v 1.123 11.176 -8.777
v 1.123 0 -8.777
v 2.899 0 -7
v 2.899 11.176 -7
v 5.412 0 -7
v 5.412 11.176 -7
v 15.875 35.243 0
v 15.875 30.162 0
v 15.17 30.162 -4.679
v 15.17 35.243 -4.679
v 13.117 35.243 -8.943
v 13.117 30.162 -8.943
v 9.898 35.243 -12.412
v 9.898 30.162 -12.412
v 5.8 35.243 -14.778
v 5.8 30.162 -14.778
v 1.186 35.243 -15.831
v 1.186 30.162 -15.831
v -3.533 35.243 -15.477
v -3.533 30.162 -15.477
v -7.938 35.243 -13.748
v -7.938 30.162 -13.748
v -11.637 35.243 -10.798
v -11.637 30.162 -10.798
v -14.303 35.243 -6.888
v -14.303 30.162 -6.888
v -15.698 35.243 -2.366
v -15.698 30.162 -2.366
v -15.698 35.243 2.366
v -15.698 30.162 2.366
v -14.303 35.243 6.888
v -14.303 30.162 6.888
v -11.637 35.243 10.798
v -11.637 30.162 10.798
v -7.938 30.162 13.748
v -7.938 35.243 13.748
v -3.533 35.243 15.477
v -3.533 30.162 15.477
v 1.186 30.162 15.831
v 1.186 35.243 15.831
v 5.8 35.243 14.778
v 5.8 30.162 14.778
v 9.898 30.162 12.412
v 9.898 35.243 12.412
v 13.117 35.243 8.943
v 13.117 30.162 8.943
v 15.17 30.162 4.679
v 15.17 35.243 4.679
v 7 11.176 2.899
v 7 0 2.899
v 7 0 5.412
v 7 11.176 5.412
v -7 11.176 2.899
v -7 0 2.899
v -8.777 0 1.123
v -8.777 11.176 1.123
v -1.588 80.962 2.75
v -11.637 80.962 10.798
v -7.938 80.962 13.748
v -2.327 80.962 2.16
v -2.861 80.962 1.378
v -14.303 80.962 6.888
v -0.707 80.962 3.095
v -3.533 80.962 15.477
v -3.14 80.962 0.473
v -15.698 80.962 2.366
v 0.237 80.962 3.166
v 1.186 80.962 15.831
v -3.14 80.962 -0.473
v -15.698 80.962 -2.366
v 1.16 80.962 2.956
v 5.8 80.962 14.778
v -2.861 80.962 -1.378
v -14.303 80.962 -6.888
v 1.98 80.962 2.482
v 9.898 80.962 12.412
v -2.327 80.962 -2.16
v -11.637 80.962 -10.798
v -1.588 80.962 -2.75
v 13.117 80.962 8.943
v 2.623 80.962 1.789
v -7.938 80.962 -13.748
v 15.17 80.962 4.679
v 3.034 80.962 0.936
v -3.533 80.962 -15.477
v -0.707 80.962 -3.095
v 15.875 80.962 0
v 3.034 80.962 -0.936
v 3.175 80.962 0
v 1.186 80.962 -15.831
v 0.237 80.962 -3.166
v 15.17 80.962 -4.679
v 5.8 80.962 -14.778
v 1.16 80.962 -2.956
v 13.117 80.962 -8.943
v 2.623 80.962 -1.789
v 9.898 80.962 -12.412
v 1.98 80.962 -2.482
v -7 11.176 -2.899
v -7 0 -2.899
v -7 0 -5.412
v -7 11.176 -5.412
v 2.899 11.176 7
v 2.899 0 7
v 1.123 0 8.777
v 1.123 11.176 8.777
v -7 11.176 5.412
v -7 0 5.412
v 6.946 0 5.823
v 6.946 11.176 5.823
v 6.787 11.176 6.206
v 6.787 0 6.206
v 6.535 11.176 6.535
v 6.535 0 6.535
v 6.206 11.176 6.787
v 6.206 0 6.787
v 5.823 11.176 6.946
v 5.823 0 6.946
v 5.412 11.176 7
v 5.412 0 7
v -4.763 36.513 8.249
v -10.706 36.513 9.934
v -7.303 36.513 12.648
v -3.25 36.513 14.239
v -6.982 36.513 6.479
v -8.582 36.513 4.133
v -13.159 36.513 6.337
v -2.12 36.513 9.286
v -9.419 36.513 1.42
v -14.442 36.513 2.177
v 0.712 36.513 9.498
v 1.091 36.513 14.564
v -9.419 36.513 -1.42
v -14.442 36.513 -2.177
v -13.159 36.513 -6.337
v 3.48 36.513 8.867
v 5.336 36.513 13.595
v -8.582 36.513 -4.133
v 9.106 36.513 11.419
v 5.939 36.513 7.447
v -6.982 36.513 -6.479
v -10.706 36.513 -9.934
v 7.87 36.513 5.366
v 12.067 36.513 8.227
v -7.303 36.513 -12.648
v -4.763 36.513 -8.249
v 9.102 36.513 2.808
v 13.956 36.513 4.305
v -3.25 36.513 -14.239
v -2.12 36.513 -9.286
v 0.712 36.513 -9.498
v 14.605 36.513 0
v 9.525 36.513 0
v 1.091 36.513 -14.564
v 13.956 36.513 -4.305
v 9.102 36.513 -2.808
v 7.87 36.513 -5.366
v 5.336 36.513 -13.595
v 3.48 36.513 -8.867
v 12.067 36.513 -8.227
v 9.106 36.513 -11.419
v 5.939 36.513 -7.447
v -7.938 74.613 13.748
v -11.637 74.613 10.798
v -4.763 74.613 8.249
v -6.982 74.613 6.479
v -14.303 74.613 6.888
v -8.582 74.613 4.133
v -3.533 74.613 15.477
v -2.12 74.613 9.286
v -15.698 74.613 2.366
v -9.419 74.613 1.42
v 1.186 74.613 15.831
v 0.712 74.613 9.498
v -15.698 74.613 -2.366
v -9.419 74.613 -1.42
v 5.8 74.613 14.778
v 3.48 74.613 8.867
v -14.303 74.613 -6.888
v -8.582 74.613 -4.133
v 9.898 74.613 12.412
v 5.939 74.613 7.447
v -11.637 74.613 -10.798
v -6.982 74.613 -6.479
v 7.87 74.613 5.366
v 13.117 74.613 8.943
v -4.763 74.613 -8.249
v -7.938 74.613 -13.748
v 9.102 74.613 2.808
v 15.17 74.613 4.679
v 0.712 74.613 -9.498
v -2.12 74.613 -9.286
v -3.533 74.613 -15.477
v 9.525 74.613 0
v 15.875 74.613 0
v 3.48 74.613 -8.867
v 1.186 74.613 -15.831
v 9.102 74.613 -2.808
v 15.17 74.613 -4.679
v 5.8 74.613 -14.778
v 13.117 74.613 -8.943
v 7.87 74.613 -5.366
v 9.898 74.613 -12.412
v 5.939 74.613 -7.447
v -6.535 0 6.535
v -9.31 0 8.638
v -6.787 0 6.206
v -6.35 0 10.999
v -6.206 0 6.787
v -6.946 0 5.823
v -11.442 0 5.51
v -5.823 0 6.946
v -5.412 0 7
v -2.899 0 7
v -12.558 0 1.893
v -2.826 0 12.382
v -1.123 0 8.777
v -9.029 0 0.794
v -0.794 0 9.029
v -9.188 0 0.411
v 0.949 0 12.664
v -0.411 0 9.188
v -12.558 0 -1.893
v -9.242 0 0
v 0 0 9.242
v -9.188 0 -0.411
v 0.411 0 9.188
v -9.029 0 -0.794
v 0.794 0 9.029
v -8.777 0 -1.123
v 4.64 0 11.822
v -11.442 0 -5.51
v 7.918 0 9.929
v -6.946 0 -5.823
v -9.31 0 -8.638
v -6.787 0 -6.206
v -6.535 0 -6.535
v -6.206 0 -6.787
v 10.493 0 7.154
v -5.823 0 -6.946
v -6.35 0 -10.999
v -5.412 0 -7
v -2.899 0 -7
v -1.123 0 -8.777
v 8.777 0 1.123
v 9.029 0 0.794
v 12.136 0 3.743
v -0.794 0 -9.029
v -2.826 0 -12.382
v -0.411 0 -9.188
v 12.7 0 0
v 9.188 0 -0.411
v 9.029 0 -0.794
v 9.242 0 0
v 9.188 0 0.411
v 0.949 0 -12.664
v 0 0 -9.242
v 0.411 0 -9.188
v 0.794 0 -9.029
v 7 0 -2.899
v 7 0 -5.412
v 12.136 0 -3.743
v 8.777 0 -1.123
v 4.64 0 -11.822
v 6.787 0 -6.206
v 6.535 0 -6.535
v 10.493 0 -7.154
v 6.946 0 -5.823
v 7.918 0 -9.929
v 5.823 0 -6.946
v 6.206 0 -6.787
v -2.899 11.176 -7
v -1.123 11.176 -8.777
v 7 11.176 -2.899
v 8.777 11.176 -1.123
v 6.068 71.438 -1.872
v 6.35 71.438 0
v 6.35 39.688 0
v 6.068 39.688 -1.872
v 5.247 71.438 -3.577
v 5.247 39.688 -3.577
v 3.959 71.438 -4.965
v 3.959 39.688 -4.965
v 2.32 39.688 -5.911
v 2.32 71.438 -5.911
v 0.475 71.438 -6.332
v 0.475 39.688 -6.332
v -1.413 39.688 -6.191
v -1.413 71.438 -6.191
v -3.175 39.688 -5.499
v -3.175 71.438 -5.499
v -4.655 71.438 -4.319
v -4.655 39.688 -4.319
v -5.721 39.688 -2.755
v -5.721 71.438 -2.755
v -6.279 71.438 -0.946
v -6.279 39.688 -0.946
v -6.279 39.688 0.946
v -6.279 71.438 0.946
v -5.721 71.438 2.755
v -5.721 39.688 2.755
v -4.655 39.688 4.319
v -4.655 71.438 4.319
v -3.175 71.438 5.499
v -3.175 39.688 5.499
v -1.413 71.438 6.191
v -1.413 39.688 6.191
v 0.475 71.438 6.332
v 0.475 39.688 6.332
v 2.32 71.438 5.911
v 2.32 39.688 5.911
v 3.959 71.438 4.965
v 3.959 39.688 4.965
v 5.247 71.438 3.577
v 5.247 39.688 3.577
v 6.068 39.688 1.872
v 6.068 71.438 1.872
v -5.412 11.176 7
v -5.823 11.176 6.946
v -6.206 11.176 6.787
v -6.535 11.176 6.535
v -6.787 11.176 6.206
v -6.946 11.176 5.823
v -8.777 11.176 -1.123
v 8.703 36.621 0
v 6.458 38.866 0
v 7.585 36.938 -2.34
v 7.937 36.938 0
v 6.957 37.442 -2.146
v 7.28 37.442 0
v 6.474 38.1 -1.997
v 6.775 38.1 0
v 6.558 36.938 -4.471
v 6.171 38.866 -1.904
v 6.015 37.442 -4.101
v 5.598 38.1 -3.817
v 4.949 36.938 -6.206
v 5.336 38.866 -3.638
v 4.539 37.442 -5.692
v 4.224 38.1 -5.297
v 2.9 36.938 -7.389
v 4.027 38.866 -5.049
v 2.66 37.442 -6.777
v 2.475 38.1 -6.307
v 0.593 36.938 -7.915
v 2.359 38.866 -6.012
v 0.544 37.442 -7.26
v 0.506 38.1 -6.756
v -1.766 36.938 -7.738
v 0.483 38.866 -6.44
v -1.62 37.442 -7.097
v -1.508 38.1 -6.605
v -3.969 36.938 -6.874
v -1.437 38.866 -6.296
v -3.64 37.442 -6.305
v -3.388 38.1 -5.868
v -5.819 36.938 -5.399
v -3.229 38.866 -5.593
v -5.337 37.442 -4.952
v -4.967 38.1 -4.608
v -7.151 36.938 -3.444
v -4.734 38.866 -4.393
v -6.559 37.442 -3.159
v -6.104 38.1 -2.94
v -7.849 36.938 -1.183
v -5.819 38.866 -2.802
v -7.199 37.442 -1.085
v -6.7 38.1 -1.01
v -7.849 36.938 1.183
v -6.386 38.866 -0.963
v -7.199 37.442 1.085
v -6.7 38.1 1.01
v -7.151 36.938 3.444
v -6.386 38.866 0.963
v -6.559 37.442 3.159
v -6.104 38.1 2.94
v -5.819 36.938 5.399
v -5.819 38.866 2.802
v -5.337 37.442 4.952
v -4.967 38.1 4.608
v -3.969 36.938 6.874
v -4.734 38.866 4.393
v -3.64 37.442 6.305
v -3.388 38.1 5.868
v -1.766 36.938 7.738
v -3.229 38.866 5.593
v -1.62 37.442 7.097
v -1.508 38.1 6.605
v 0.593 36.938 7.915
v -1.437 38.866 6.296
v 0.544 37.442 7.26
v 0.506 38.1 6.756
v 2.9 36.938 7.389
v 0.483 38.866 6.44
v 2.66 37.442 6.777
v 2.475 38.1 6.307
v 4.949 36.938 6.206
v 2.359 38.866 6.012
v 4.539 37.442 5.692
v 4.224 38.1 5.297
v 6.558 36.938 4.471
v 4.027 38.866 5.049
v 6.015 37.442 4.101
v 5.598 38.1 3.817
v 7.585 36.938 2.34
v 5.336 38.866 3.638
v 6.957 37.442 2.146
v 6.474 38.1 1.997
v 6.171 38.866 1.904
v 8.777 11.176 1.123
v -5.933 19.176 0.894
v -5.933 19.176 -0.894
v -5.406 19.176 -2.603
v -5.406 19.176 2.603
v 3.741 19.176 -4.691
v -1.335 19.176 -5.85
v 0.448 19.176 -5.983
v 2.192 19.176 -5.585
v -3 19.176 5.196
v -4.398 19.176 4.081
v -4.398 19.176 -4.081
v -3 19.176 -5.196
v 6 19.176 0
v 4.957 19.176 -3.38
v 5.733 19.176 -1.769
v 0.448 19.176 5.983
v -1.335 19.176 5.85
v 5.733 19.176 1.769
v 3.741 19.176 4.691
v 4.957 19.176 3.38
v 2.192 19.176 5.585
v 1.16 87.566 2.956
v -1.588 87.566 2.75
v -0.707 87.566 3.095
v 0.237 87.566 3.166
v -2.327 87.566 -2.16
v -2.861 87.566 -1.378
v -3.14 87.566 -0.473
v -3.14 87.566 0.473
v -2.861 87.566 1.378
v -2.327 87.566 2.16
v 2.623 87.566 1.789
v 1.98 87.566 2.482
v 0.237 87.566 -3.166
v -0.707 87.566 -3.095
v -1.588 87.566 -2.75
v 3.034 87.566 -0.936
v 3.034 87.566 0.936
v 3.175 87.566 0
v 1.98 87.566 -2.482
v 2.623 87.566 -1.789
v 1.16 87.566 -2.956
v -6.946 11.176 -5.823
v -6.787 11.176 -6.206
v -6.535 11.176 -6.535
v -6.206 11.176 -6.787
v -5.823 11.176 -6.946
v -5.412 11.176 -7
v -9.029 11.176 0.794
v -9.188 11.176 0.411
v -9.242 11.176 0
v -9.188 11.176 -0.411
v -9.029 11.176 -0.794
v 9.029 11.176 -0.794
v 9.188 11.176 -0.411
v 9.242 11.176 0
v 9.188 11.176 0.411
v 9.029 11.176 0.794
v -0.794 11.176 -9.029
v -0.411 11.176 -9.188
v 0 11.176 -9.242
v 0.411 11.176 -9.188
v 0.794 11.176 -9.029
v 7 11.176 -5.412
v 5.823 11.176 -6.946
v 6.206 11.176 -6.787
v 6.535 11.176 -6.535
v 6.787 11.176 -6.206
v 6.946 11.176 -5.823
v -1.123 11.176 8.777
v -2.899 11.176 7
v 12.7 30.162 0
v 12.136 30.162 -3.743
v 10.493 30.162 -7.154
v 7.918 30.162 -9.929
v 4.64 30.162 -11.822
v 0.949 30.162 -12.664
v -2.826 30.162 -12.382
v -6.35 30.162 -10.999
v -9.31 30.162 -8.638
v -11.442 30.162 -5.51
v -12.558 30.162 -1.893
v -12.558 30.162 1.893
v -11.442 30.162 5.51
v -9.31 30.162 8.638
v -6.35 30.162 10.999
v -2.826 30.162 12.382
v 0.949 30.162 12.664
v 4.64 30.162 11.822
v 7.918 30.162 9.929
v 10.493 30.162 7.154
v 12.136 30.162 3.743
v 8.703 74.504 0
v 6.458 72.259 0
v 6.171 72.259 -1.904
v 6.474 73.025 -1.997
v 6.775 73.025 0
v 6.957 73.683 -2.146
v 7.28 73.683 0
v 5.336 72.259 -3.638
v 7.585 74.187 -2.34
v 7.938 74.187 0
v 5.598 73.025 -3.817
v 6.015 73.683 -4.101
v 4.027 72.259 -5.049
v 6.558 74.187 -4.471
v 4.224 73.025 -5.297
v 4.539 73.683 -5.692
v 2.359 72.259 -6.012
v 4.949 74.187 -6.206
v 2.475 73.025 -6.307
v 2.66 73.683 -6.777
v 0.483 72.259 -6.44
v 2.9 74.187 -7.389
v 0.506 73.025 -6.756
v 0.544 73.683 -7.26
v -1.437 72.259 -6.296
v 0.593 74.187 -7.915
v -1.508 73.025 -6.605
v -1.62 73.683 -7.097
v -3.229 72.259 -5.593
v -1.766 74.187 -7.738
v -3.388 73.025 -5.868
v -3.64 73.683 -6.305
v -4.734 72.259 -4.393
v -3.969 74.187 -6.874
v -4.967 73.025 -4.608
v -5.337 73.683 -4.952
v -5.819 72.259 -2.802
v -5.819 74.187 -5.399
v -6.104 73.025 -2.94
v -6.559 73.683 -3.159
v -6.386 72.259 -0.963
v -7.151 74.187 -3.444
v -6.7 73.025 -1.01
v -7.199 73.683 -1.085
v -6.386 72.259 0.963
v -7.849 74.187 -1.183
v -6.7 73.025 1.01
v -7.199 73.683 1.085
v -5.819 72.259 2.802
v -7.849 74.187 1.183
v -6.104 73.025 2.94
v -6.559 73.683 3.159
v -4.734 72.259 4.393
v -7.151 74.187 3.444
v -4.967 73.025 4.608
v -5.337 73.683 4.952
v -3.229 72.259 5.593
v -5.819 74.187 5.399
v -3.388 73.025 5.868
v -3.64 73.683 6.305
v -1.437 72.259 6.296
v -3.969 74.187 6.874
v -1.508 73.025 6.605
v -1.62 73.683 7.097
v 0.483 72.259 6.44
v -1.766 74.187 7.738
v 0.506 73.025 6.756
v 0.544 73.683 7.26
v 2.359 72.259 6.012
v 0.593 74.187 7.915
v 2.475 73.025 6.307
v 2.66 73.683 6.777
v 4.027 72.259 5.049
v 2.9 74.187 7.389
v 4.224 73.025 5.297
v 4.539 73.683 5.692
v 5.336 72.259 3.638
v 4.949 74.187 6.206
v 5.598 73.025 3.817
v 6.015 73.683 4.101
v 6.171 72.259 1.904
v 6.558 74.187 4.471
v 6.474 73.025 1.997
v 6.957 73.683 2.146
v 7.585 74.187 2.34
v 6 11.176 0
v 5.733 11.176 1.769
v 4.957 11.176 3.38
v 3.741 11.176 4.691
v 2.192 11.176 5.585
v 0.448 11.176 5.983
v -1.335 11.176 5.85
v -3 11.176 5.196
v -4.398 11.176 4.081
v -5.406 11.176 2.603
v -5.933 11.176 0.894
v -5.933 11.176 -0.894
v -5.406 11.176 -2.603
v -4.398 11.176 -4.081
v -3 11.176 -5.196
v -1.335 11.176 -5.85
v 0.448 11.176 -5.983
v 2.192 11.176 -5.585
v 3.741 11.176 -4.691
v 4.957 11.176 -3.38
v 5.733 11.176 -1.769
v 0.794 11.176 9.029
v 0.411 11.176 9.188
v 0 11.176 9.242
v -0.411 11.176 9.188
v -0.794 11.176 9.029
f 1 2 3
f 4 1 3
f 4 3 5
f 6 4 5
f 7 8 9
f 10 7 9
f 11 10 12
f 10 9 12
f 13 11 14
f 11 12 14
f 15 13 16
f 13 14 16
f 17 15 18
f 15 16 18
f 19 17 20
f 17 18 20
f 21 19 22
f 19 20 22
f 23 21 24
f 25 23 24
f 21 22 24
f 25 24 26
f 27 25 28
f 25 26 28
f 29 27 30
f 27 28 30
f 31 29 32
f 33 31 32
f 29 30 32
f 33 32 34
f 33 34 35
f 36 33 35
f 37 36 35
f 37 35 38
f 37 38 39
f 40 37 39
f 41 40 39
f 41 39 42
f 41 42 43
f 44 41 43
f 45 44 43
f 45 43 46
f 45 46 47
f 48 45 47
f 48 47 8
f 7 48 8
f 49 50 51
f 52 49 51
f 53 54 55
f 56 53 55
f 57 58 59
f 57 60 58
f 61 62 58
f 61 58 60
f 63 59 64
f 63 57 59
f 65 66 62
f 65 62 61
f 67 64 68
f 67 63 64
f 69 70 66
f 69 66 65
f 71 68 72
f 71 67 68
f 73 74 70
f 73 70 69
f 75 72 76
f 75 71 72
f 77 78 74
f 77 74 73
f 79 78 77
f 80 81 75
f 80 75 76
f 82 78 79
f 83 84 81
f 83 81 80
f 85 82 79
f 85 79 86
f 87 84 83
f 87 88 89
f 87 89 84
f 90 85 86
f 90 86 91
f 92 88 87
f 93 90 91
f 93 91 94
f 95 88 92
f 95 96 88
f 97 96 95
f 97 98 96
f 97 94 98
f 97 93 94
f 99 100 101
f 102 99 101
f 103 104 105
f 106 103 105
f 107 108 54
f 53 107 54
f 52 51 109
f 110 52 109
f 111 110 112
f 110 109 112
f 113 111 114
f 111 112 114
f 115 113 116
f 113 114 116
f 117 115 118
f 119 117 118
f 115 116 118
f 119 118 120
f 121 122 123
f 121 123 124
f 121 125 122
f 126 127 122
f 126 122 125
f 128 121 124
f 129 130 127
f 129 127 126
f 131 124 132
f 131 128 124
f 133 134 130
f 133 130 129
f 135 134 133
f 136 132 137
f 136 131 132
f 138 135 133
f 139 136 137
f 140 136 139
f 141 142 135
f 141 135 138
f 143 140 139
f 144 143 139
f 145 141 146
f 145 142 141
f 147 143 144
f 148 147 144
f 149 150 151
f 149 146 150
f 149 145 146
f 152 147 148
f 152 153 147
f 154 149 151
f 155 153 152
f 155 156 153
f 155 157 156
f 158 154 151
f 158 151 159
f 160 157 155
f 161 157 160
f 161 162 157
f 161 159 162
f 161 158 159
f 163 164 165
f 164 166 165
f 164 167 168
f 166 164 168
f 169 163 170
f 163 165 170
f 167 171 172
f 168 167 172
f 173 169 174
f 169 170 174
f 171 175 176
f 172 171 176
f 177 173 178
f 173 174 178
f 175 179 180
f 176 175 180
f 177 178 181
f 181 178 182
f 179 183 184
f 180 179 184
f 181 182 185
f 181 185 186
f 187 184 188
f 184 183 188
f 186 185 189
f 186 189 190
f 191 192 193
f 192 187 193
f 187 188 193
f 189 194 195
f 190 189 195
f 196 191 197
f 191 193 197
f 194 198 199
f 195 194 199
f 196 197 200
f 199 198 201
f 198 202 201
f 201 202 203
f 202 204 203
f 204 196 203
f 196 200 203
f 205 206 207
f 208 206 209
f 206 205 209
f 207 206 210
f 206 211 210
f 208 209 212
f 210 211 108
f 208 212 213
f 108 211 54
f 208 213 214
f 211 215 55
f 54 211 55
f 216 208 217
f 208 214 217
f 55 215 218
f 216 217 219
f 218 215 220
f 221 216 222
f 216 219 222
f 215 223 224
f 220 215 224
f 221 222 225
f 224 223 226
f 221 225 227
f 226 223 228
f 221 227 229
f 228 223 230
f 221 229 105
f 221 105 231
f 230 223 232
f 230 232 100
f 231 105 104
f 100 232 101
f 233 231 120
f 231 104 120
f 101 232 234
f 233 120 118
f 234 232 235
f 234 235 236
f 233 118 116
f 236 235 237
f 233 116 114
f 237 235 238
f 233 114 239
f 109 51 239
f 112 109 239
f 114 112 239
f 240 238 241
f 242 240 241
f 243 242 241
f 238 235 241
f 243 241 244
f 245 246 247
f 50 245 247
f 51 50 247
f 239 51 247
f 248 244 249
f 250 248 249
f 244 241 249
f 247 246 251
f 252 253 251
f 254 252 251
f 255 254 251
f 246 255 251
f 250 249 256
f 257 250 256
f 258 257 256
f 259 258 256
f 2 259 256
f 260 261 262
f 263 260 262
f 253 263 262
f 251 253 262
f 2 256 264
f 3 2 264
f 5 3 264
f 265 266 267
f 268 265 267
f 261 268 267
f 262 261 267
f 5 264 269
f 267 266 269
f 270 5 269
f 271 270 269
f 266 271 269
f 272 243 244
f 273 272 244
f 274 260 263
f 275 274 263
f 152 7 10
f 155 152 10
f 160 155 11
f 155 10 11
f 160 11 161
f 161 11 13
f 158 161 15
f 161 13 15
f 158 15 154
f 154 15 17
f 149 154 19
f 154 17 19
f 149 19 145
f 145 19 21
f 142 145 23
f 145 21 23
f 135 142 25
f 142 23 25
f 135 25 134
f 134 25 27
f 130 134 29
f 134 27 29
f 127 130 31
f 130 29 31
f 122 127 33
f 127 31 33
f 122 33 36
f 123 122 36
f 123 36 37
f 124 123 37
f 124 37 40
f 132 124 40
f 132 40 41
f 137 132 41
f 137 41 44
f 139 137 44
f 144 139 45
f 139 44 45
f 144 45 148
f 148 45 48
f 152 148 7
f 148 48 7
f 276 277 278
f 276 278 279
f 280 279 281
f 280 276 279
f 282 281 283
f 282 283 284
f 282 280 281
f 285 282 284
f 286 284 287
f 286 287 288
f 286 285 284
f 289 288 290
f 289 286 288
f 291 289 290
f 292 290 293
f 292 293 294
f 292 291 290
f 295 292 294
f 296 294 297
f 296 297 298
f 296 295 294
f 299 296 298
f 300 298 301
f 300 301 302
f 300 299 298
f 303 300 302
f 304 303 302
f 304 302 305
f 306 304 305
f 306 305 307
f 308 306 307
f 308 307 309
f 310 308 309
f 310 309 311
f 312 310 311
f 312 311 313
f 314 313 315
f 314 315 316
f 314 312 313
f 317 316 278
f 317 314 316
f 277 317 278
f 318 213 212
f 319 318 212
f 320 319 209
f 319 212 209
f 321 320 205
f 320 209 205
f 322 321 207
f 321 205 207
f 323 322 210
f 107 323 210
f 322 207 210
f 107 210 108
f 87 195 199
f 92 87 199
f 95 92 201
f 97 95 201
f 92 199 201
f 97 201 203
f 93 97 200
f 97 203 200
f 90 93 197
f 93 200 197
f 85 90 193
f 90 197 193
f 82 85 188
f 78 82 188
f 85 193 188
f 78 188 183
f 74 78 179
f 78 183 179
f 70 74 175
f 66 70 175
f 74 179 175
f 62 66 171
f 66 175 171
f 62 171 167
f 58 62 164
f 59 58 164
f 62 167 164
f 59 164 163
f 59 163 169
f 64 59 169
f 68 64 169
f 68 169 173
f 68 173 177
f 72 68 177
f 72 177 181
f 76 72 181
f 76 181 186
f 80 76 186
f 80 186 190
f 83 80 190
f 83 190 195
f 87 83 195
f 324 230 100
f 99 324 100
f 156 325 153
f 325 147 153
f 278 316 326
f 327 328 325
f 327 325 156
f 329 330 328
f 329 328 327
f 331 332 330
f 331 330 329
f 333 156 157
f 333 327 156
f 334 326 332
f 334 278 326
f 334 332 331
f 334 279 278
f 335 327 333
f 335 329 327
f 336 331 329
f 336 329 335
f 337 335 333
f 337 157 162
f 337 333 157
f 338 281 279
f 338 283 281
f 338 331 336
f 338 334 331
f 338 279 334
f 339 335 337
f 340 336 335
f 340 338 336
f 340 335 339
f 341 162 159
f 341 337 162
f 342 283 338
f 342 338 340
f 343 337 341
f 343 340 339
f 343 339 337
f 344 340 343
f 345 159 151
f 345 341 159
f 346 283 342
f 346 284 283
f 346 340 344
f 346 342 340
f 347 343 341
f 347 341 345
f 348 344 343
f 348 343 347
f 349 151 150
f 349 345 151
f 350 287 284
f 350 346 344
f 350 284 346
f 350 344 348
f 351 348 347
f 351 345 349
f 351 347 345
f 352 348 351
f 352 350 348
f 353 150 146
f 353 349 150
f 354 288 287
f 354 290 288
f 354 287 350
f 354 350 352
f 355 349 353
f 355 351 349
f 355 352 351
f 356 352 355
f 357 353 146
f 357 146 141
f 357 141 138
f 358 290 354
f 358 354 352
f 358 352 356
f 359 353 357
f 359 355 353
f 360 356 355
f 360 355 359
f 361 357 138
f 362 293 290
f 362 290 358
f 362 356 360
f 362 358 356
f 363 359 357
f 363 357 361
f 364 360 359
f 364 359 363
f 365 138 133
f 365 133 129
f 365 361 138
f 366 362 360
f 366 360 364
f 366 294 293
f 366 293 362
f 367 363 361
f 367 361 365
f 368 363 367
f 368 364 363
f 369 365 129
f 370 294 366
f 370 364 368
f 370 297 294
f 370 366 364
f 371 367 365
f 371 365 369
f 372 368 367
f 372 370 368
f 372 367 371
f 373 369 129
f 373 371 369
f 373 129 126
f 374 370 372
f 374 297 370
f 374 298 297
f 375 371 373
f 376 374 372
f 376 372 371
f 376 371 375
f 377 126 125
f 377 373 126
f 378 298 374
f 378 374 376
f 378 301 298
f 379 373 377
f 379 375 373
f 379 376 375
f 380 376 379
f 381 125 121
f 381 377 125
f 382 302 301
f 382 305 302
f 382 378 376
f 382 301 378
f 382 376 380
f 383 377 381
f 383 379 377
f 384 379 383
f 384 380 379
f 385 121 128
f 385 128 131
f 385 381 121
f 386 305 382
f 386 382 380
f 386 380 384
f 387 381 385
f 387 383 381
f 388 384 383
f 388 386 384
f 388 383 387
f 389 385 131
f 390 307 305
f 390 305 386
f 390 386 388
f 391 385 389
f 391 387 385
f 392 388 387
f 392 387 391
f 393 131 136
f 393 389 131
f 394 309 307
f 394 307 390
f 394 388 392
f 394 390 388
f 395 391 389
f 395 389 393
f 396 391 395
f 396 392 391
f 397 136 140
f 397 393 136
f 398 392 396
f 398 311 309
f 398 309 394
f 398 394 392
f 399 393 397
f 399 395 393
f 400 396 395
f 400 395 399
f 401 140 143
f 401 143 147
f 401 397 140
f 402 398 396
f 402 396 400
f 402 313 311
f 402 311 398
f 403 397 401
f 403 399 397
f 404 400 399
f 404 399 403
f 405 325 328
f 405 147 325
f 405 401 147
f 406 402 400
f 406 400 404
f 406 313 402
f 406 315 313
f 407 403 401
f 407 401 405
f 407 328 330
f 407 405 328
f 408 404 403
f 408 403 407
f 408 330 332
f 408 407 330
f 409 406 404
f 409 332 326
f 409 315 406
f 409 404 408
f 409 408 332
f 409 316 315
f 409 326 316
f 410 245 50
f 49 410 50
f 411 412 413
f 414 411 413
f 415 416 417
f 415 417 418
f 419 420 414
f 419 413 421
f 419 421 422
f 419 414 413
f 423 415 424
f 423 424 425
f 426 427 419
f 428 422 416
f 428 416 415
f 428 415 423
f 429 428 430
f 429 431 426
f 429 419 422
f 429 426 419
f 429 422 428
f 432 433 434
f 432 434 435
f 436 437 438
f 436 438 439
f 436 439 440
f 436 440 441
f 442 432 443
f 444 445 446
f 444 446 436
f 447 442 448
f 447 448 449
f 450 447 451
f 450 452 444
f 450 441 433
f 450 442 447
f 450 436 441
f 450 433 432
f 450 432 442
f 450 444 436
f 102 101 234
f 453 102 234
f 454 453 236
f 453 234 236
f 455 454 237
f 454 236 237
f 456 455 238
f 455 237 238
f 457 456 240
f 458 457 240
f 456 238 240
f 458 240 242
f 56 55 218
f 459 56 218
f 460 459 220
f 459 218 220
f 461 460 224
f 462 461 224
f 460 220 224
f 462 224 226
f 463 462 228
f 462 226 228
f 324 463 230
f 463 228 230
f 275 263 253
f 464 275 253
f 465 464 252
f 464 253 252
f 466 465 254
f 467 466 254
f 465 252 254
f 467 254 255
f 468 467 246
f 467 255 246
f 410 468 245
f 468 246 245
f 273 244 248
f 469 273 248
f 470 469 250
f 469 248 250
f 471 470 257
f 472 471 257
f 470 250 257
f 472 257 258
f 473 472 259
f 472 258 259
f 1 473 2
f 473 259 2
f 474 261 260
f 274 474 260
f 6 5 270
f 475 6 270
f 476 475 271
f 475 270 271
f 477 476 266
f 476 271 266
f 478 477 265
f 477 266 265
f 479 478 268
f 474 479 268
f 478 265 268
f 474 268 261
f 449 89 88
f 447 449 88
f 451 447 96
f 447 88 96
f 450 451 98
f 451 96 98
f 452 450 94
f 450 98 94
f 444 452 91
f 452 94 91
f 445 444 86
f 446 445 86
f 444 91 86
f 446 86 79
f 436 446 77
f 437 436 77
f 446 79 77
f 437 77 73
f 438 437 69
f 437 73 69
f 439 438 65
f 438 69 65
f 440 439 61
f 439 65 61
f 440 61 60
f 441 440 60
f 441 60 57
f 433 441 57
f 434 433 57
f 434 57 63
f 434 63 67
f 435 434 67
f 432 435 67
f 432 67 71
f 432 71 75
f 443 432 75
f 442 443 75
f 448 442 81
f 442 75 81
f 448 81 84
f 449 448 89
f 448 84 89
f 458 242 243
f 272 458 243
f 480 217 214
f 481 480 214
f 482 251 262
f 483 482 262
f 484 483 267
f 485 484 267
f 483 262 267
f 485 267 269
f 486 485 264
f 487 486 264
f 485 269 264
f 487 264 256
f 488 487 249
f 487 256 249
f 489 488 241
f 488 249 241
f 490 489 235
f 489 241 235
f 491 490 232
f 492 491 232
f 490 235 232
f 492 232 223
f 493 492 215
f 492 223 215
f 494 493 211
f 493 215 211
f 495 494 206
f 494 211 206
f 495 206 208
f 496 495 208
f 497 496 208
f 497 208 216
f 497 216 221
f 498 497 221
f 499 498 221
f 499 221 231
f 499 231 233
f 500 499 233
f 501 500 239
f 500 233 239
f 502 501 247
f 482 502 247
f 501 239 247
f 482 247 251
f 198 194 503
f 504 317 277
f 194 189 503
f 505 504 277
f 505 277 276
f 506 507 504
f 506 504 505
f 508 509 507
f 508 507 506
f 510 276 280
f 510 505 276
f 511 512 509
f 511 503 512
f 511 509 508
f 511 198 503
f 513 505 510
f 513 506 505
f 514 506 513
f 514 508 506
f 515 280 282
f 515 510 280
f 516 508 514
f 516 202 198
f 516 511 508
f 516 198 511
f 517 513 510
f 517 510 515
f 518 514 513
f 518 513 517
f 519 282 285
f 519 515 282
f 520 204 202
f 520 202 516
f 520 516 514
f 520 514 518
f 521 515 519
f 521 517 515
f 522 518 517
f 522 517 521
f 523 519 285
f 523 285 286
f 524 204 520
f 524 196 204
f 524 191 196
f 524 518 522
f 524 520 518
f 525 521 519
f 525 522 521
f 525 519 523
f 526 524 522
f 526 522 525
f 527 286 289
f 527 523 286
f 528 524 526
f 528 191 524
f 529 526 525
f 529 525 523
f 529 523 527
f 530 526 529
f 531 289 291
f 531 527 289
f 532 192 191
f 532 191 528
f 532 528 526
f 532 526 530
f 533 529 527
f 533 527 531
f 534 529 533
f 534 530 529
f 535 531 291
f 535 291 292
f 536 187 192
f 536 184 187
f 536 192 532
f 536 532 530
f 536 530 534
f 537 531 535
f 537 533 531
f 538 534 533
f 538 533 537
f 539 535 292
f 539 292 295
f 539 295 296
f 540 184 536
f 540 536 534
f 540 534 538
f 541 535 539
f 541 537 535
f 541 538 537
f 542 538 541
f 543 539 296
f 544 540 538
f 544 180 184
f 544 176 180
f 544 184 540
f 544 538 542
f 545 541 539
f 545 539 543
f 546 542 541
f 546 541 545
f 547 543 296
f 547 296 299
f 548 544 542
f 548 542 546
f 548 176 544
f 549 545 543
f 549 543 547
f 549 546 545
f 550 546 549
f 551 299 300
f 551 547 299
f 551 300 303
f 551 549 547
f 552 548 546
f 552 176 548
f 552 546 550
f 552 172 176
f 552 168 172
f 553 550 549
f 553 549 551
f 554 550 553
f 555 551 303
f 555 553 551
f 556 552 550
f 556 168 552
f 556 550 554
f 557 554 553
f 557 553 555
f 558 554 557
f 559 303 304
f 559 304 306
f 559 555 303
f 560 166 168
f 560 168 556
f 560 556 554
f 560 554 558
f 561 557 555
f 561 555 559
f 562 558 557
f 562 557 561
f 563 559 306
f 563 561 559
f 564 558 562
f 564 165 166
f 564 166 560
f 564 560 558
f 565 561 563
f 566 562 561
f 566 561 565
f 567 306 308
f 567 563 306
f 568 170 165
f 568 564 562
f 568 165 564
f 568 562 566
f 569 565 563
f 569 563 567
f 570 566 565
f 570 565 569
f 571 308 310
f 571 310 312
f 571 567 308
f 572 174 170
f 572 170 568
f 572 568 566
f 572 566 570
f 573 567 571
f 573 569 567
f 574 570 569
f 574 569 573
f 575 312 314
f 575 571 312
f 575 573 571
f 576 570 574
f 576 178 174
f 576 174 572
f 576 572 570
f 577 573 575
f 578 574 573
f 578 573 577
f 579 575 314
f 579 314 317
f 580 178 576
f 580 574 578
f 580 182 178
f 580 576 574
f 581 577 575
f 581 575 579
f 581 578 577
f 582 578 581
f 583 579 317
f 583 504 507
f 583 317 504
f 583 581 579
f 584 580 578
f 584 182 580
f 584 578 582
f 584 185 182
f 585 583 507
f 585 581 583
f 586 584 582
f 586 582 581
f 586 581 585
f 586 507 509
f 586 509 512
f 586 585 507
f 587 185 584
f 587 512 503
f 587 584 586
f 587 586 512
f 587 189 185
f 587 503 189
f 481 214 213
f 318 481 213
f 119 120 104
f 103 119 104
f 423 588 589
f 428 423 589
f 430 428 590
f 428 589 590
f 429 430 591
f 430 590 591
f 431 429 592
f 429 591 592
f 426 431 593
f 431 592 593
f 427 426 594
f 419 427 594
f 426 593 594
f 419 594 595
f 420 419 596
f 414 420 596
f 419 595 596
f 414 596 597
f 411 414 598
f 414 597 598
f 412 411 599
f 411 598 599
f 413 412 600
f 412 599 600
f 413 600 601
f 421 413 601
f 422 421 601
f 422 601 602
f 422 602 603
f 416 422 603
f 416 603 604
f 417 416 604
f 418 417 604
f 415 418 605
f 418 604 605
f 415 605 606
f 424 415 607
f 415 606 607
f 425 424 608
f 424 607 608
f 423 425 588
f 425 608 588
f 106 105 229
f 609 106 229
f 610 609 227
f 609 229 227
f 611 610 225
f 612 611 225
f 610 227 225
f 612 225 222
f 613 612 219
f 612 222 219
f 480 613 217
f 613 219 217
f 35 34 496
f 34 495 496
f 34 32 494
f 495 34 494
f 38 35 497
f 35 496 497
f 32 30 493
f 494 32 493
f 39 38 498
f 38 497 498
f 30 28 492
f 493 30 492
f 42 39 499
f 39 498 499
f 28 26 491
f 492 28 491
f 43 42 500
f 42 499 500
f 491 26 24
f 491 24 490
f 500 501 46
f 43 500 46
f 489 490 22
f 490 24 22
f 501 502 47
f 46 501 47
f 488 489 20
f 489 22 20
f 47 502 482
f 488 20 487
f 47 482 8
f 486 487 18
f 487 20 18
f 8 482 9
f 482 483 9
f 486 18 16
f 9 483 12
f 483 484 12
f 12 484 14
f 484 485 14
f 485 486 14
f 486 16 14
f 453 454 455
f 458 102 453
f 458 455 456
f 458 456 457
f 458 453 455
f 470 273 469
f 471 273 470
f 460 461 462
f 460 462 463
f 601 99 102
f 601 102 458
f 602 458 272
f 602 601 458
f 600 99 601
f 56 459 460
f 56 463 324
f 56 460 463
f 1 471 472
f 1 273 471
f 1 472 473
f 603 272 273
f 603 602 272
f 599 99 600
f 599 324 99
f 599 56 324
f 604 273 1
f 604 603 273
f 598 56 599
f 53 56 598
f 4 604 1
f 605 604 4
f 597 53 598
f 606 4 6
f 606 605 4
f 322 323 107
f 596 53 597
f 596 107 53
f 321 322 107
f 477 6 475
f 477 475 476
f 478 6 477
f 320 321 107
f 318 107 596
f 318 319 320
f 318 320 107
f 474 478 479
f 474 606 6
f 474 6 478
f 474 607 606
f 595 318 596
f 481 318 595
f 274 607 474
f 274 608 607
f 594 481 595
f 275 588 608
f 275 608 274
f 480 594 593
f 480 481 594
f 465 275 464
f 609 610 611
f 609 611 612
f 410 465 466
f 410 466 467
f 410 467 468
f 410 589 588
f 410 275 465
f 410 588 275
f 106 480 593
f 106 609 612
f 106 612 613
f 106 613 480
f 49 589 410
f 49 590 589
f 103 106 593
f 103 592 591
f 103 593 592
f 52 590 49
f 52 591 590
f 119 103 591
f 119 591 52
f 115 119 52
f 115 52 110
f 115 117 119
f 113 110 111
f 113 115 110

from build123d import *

# Parameters (mm, degrees)
SKETCH1_R           = 12.7
BOSS_EXTRUDE1_DEPTH = 30.1625
SKETCH4_R           = 15.875
BOSS_EXTRUDE2_DEPTH = 50.8
CUT_EXTRUDE1_DEPTH  = 11.176
SKETCH3_R           = 6
CUT_EXTRUDE2_DEPTH  = 8
SKETCH5_R           = 3.175
BOSS_EXTRUDE3_DEPTH = 6.604
CUT_EXTRUDE3_START  = -6.35
SKETCH9_R           = 15.875
SKETCH9_R_2         = 6.35
CUT_EXTRUDE3_DEPTH  = 38.1
FILLET1_R           = 3.175
CHAMFER1_SIZE       = 1.27


with BuildPart() as part:
    # Sketch1 → Boss-Extrude1 (new body)
    with BuildSketch(Plane(origin=(0, 0, 0), x_dir=(1, 0, 0), z_dir=(0, 1, 0))):
        Circle(SKETCH1_R)
    extrude(amount=BOSS_EXTRUDE1_DEPTH)

    # Sketch4 → Boss-Extrude2 (add)
    with BuildSketch(Plane(origin=(0, 30.1625, 0), x_dir=(1, 0, 0), z_dir=(0, 1, 0))):
        Circle(SKETCH4_R)
    extrude(amount=BOSS_EXTRUDE2_DEPTH)

    # Sketch2 → Cut-Extrude1 (cut)
    with BuildSketch(Plane.XZ):
        with BuildLine():
            Line((-7, 2.899494937), (-8.776962921, 1.122532015))
            ThreePointArc((-8.776962921, 1.122532015), (-9.241930906, 0), (-8.776962921, -1.122532015))
            Line((-8.776962921, -1.122532015), (-7, -2.899494937))
            Line((-7, -2.899494937), (-7, 2.899494937))
        make_face()
        Polygon((-2.899494937, 7), (-7, 2.899494937), (-7, -2.899494937), (-2.899494937, -7), (2.899494937, -7), (7, -2.899494937), (7, 2.899494937), (2.899494937, 7), align=None)
        with BuildLine():
            Line((-7, 5.4125), (-7, 2.899494937))
            Line((-7, 2.899494937), (-2.899494937, 7))
            Line((-2.899494937, 7), (-5.4125, 7))
            ThreePointArc((-5.4125, 7), (-6.535032015, 6.535032015), (-7, 5.4125))
        make_face()
        with BuildLine():
            Line((-1.122532015, 8.776962921), (-2.899494937, 7))
            Line((-2.899494937, 7), (2.899494937, 7))
            Line((2.899494937, 7), (1.122532015, 8.776962921))
            ThreePointArc((1.122532015, 8.776962921), (0, 9.241930906), (-1.122532015, 8.776962921))
        make_face()
        with BuildLine():
            Line((5.4125, 7), (2.899494937, 7))
            Line((2.899494937, 7), (7, 2.899494937))
            Line((7, 2.899494937), (7, 5.4125))
            ThreePointArc((7, 5.4125), (6.535032015, 6.535032015), (5.4125, 7))
        make_face()
        with BuildLine():
            Line((8.776962921, 1.122532015), (7, 2.899494937))
            Line((7, 2.899494937), (7, -2.899494937))
            Line((7, -2.899494937), (8.776962921, -1.122532015))
            ThreePointArc((8.776962921, -1.122532015), (9.241930906, 0), (8.776962921, 1.122532015))
        make_face()
        with BuildLine():
            Line((7, -2.899494937), (2.899494937, -7))
            Line((2.899494937, -7), (5.4125, -7))
            ThreePointArc((5.4125, -7), (6.535032015, -6.535032015), (7, -5.4125))
            Line((7, -5.4125), (7, -2.899494937))
        make_face()
        with BuildLine():
            Line((2.899494937, -7), (-2.899494937, -7))
            Line((-2.899494937, -7), (-1.122532015, -8.776962921))
            ThreePointArc((-1.122532015, -8.776962921), (0, -9.241930906), (1.122532015, -8.776962921))
            Line((1.122532015, -8.776962921), (2.899494937, -7))
        make_face()
        with BuildLine():
            Line((-2.899494937, -7), (-7, -2.899494937))
            Line((-7, -2.899494937), (-7, -5.4125))
            ThreePointArc((-7, -5.4125), (-6.535032015, -6.535032015), (-5.4125, -7))
            Line((-5.4125, -7), (-2.899494937, -7))
        make_face()
    extrude(amount=-CUT_EXTRUDE1_DEPTH, mode=Mode.SUBTRACT)

    # Sketch3 → Cut-Extrude2 (cut)
    with BuildSketch(Plane.XZ.offset(-11.176)):
        Circle(SKETCH3_R)
    extrude(amount=-CUT_EXTRUDE2_DEPTH, mode=Mode.SUBTRACT)

    # Sketch5 → Boss-Extrude3 (add)
    with BuildSketch(Plane(origin=(0, 80.9625, 0), x_dir=(1, 0, 0), z_dir=(0, 1, 0))):
        Circle(SKETCH5_R)
    extrude(amount=BOSS_EXTRUDE3_DEPTH)

    # Sketch9 → Cut-Extrude3 (cut)
    with BuildSketch(Plane(origin=(0, 80.9625, 0), x_dir=(1, 0, 0), z_dir=(0, 1, 0)).offset(CUT_EXTRUDE3_START)):
        Circle(SKETCH9_R)
        Circle(SKETCH9_R_2, mode=Mode.SUBTRACT)
    extrude(amount=-CUT_EXTRUDE3_DEPTH, mode=Mode.SUBTRACT)

    # Fillet1
    fillet1_edges = [part.edges().sort_by_distance(p)[0] for p in [
        (-6.35, 36.5125, 0),
        (-6.35, 74.6125, 0),
    ]]
    fillet(fillet1_edges, radius=FILLET1_R)

    # Chamfer1
    chamfer1_edges = [part.edges().sort_by_distance(p)[0] for p in [
        (-15.875, 36.5125, 0),
    ]]
    chamfer(chamfer1_edges, length=CHAMFER1_SIZE)


solid = part.part
